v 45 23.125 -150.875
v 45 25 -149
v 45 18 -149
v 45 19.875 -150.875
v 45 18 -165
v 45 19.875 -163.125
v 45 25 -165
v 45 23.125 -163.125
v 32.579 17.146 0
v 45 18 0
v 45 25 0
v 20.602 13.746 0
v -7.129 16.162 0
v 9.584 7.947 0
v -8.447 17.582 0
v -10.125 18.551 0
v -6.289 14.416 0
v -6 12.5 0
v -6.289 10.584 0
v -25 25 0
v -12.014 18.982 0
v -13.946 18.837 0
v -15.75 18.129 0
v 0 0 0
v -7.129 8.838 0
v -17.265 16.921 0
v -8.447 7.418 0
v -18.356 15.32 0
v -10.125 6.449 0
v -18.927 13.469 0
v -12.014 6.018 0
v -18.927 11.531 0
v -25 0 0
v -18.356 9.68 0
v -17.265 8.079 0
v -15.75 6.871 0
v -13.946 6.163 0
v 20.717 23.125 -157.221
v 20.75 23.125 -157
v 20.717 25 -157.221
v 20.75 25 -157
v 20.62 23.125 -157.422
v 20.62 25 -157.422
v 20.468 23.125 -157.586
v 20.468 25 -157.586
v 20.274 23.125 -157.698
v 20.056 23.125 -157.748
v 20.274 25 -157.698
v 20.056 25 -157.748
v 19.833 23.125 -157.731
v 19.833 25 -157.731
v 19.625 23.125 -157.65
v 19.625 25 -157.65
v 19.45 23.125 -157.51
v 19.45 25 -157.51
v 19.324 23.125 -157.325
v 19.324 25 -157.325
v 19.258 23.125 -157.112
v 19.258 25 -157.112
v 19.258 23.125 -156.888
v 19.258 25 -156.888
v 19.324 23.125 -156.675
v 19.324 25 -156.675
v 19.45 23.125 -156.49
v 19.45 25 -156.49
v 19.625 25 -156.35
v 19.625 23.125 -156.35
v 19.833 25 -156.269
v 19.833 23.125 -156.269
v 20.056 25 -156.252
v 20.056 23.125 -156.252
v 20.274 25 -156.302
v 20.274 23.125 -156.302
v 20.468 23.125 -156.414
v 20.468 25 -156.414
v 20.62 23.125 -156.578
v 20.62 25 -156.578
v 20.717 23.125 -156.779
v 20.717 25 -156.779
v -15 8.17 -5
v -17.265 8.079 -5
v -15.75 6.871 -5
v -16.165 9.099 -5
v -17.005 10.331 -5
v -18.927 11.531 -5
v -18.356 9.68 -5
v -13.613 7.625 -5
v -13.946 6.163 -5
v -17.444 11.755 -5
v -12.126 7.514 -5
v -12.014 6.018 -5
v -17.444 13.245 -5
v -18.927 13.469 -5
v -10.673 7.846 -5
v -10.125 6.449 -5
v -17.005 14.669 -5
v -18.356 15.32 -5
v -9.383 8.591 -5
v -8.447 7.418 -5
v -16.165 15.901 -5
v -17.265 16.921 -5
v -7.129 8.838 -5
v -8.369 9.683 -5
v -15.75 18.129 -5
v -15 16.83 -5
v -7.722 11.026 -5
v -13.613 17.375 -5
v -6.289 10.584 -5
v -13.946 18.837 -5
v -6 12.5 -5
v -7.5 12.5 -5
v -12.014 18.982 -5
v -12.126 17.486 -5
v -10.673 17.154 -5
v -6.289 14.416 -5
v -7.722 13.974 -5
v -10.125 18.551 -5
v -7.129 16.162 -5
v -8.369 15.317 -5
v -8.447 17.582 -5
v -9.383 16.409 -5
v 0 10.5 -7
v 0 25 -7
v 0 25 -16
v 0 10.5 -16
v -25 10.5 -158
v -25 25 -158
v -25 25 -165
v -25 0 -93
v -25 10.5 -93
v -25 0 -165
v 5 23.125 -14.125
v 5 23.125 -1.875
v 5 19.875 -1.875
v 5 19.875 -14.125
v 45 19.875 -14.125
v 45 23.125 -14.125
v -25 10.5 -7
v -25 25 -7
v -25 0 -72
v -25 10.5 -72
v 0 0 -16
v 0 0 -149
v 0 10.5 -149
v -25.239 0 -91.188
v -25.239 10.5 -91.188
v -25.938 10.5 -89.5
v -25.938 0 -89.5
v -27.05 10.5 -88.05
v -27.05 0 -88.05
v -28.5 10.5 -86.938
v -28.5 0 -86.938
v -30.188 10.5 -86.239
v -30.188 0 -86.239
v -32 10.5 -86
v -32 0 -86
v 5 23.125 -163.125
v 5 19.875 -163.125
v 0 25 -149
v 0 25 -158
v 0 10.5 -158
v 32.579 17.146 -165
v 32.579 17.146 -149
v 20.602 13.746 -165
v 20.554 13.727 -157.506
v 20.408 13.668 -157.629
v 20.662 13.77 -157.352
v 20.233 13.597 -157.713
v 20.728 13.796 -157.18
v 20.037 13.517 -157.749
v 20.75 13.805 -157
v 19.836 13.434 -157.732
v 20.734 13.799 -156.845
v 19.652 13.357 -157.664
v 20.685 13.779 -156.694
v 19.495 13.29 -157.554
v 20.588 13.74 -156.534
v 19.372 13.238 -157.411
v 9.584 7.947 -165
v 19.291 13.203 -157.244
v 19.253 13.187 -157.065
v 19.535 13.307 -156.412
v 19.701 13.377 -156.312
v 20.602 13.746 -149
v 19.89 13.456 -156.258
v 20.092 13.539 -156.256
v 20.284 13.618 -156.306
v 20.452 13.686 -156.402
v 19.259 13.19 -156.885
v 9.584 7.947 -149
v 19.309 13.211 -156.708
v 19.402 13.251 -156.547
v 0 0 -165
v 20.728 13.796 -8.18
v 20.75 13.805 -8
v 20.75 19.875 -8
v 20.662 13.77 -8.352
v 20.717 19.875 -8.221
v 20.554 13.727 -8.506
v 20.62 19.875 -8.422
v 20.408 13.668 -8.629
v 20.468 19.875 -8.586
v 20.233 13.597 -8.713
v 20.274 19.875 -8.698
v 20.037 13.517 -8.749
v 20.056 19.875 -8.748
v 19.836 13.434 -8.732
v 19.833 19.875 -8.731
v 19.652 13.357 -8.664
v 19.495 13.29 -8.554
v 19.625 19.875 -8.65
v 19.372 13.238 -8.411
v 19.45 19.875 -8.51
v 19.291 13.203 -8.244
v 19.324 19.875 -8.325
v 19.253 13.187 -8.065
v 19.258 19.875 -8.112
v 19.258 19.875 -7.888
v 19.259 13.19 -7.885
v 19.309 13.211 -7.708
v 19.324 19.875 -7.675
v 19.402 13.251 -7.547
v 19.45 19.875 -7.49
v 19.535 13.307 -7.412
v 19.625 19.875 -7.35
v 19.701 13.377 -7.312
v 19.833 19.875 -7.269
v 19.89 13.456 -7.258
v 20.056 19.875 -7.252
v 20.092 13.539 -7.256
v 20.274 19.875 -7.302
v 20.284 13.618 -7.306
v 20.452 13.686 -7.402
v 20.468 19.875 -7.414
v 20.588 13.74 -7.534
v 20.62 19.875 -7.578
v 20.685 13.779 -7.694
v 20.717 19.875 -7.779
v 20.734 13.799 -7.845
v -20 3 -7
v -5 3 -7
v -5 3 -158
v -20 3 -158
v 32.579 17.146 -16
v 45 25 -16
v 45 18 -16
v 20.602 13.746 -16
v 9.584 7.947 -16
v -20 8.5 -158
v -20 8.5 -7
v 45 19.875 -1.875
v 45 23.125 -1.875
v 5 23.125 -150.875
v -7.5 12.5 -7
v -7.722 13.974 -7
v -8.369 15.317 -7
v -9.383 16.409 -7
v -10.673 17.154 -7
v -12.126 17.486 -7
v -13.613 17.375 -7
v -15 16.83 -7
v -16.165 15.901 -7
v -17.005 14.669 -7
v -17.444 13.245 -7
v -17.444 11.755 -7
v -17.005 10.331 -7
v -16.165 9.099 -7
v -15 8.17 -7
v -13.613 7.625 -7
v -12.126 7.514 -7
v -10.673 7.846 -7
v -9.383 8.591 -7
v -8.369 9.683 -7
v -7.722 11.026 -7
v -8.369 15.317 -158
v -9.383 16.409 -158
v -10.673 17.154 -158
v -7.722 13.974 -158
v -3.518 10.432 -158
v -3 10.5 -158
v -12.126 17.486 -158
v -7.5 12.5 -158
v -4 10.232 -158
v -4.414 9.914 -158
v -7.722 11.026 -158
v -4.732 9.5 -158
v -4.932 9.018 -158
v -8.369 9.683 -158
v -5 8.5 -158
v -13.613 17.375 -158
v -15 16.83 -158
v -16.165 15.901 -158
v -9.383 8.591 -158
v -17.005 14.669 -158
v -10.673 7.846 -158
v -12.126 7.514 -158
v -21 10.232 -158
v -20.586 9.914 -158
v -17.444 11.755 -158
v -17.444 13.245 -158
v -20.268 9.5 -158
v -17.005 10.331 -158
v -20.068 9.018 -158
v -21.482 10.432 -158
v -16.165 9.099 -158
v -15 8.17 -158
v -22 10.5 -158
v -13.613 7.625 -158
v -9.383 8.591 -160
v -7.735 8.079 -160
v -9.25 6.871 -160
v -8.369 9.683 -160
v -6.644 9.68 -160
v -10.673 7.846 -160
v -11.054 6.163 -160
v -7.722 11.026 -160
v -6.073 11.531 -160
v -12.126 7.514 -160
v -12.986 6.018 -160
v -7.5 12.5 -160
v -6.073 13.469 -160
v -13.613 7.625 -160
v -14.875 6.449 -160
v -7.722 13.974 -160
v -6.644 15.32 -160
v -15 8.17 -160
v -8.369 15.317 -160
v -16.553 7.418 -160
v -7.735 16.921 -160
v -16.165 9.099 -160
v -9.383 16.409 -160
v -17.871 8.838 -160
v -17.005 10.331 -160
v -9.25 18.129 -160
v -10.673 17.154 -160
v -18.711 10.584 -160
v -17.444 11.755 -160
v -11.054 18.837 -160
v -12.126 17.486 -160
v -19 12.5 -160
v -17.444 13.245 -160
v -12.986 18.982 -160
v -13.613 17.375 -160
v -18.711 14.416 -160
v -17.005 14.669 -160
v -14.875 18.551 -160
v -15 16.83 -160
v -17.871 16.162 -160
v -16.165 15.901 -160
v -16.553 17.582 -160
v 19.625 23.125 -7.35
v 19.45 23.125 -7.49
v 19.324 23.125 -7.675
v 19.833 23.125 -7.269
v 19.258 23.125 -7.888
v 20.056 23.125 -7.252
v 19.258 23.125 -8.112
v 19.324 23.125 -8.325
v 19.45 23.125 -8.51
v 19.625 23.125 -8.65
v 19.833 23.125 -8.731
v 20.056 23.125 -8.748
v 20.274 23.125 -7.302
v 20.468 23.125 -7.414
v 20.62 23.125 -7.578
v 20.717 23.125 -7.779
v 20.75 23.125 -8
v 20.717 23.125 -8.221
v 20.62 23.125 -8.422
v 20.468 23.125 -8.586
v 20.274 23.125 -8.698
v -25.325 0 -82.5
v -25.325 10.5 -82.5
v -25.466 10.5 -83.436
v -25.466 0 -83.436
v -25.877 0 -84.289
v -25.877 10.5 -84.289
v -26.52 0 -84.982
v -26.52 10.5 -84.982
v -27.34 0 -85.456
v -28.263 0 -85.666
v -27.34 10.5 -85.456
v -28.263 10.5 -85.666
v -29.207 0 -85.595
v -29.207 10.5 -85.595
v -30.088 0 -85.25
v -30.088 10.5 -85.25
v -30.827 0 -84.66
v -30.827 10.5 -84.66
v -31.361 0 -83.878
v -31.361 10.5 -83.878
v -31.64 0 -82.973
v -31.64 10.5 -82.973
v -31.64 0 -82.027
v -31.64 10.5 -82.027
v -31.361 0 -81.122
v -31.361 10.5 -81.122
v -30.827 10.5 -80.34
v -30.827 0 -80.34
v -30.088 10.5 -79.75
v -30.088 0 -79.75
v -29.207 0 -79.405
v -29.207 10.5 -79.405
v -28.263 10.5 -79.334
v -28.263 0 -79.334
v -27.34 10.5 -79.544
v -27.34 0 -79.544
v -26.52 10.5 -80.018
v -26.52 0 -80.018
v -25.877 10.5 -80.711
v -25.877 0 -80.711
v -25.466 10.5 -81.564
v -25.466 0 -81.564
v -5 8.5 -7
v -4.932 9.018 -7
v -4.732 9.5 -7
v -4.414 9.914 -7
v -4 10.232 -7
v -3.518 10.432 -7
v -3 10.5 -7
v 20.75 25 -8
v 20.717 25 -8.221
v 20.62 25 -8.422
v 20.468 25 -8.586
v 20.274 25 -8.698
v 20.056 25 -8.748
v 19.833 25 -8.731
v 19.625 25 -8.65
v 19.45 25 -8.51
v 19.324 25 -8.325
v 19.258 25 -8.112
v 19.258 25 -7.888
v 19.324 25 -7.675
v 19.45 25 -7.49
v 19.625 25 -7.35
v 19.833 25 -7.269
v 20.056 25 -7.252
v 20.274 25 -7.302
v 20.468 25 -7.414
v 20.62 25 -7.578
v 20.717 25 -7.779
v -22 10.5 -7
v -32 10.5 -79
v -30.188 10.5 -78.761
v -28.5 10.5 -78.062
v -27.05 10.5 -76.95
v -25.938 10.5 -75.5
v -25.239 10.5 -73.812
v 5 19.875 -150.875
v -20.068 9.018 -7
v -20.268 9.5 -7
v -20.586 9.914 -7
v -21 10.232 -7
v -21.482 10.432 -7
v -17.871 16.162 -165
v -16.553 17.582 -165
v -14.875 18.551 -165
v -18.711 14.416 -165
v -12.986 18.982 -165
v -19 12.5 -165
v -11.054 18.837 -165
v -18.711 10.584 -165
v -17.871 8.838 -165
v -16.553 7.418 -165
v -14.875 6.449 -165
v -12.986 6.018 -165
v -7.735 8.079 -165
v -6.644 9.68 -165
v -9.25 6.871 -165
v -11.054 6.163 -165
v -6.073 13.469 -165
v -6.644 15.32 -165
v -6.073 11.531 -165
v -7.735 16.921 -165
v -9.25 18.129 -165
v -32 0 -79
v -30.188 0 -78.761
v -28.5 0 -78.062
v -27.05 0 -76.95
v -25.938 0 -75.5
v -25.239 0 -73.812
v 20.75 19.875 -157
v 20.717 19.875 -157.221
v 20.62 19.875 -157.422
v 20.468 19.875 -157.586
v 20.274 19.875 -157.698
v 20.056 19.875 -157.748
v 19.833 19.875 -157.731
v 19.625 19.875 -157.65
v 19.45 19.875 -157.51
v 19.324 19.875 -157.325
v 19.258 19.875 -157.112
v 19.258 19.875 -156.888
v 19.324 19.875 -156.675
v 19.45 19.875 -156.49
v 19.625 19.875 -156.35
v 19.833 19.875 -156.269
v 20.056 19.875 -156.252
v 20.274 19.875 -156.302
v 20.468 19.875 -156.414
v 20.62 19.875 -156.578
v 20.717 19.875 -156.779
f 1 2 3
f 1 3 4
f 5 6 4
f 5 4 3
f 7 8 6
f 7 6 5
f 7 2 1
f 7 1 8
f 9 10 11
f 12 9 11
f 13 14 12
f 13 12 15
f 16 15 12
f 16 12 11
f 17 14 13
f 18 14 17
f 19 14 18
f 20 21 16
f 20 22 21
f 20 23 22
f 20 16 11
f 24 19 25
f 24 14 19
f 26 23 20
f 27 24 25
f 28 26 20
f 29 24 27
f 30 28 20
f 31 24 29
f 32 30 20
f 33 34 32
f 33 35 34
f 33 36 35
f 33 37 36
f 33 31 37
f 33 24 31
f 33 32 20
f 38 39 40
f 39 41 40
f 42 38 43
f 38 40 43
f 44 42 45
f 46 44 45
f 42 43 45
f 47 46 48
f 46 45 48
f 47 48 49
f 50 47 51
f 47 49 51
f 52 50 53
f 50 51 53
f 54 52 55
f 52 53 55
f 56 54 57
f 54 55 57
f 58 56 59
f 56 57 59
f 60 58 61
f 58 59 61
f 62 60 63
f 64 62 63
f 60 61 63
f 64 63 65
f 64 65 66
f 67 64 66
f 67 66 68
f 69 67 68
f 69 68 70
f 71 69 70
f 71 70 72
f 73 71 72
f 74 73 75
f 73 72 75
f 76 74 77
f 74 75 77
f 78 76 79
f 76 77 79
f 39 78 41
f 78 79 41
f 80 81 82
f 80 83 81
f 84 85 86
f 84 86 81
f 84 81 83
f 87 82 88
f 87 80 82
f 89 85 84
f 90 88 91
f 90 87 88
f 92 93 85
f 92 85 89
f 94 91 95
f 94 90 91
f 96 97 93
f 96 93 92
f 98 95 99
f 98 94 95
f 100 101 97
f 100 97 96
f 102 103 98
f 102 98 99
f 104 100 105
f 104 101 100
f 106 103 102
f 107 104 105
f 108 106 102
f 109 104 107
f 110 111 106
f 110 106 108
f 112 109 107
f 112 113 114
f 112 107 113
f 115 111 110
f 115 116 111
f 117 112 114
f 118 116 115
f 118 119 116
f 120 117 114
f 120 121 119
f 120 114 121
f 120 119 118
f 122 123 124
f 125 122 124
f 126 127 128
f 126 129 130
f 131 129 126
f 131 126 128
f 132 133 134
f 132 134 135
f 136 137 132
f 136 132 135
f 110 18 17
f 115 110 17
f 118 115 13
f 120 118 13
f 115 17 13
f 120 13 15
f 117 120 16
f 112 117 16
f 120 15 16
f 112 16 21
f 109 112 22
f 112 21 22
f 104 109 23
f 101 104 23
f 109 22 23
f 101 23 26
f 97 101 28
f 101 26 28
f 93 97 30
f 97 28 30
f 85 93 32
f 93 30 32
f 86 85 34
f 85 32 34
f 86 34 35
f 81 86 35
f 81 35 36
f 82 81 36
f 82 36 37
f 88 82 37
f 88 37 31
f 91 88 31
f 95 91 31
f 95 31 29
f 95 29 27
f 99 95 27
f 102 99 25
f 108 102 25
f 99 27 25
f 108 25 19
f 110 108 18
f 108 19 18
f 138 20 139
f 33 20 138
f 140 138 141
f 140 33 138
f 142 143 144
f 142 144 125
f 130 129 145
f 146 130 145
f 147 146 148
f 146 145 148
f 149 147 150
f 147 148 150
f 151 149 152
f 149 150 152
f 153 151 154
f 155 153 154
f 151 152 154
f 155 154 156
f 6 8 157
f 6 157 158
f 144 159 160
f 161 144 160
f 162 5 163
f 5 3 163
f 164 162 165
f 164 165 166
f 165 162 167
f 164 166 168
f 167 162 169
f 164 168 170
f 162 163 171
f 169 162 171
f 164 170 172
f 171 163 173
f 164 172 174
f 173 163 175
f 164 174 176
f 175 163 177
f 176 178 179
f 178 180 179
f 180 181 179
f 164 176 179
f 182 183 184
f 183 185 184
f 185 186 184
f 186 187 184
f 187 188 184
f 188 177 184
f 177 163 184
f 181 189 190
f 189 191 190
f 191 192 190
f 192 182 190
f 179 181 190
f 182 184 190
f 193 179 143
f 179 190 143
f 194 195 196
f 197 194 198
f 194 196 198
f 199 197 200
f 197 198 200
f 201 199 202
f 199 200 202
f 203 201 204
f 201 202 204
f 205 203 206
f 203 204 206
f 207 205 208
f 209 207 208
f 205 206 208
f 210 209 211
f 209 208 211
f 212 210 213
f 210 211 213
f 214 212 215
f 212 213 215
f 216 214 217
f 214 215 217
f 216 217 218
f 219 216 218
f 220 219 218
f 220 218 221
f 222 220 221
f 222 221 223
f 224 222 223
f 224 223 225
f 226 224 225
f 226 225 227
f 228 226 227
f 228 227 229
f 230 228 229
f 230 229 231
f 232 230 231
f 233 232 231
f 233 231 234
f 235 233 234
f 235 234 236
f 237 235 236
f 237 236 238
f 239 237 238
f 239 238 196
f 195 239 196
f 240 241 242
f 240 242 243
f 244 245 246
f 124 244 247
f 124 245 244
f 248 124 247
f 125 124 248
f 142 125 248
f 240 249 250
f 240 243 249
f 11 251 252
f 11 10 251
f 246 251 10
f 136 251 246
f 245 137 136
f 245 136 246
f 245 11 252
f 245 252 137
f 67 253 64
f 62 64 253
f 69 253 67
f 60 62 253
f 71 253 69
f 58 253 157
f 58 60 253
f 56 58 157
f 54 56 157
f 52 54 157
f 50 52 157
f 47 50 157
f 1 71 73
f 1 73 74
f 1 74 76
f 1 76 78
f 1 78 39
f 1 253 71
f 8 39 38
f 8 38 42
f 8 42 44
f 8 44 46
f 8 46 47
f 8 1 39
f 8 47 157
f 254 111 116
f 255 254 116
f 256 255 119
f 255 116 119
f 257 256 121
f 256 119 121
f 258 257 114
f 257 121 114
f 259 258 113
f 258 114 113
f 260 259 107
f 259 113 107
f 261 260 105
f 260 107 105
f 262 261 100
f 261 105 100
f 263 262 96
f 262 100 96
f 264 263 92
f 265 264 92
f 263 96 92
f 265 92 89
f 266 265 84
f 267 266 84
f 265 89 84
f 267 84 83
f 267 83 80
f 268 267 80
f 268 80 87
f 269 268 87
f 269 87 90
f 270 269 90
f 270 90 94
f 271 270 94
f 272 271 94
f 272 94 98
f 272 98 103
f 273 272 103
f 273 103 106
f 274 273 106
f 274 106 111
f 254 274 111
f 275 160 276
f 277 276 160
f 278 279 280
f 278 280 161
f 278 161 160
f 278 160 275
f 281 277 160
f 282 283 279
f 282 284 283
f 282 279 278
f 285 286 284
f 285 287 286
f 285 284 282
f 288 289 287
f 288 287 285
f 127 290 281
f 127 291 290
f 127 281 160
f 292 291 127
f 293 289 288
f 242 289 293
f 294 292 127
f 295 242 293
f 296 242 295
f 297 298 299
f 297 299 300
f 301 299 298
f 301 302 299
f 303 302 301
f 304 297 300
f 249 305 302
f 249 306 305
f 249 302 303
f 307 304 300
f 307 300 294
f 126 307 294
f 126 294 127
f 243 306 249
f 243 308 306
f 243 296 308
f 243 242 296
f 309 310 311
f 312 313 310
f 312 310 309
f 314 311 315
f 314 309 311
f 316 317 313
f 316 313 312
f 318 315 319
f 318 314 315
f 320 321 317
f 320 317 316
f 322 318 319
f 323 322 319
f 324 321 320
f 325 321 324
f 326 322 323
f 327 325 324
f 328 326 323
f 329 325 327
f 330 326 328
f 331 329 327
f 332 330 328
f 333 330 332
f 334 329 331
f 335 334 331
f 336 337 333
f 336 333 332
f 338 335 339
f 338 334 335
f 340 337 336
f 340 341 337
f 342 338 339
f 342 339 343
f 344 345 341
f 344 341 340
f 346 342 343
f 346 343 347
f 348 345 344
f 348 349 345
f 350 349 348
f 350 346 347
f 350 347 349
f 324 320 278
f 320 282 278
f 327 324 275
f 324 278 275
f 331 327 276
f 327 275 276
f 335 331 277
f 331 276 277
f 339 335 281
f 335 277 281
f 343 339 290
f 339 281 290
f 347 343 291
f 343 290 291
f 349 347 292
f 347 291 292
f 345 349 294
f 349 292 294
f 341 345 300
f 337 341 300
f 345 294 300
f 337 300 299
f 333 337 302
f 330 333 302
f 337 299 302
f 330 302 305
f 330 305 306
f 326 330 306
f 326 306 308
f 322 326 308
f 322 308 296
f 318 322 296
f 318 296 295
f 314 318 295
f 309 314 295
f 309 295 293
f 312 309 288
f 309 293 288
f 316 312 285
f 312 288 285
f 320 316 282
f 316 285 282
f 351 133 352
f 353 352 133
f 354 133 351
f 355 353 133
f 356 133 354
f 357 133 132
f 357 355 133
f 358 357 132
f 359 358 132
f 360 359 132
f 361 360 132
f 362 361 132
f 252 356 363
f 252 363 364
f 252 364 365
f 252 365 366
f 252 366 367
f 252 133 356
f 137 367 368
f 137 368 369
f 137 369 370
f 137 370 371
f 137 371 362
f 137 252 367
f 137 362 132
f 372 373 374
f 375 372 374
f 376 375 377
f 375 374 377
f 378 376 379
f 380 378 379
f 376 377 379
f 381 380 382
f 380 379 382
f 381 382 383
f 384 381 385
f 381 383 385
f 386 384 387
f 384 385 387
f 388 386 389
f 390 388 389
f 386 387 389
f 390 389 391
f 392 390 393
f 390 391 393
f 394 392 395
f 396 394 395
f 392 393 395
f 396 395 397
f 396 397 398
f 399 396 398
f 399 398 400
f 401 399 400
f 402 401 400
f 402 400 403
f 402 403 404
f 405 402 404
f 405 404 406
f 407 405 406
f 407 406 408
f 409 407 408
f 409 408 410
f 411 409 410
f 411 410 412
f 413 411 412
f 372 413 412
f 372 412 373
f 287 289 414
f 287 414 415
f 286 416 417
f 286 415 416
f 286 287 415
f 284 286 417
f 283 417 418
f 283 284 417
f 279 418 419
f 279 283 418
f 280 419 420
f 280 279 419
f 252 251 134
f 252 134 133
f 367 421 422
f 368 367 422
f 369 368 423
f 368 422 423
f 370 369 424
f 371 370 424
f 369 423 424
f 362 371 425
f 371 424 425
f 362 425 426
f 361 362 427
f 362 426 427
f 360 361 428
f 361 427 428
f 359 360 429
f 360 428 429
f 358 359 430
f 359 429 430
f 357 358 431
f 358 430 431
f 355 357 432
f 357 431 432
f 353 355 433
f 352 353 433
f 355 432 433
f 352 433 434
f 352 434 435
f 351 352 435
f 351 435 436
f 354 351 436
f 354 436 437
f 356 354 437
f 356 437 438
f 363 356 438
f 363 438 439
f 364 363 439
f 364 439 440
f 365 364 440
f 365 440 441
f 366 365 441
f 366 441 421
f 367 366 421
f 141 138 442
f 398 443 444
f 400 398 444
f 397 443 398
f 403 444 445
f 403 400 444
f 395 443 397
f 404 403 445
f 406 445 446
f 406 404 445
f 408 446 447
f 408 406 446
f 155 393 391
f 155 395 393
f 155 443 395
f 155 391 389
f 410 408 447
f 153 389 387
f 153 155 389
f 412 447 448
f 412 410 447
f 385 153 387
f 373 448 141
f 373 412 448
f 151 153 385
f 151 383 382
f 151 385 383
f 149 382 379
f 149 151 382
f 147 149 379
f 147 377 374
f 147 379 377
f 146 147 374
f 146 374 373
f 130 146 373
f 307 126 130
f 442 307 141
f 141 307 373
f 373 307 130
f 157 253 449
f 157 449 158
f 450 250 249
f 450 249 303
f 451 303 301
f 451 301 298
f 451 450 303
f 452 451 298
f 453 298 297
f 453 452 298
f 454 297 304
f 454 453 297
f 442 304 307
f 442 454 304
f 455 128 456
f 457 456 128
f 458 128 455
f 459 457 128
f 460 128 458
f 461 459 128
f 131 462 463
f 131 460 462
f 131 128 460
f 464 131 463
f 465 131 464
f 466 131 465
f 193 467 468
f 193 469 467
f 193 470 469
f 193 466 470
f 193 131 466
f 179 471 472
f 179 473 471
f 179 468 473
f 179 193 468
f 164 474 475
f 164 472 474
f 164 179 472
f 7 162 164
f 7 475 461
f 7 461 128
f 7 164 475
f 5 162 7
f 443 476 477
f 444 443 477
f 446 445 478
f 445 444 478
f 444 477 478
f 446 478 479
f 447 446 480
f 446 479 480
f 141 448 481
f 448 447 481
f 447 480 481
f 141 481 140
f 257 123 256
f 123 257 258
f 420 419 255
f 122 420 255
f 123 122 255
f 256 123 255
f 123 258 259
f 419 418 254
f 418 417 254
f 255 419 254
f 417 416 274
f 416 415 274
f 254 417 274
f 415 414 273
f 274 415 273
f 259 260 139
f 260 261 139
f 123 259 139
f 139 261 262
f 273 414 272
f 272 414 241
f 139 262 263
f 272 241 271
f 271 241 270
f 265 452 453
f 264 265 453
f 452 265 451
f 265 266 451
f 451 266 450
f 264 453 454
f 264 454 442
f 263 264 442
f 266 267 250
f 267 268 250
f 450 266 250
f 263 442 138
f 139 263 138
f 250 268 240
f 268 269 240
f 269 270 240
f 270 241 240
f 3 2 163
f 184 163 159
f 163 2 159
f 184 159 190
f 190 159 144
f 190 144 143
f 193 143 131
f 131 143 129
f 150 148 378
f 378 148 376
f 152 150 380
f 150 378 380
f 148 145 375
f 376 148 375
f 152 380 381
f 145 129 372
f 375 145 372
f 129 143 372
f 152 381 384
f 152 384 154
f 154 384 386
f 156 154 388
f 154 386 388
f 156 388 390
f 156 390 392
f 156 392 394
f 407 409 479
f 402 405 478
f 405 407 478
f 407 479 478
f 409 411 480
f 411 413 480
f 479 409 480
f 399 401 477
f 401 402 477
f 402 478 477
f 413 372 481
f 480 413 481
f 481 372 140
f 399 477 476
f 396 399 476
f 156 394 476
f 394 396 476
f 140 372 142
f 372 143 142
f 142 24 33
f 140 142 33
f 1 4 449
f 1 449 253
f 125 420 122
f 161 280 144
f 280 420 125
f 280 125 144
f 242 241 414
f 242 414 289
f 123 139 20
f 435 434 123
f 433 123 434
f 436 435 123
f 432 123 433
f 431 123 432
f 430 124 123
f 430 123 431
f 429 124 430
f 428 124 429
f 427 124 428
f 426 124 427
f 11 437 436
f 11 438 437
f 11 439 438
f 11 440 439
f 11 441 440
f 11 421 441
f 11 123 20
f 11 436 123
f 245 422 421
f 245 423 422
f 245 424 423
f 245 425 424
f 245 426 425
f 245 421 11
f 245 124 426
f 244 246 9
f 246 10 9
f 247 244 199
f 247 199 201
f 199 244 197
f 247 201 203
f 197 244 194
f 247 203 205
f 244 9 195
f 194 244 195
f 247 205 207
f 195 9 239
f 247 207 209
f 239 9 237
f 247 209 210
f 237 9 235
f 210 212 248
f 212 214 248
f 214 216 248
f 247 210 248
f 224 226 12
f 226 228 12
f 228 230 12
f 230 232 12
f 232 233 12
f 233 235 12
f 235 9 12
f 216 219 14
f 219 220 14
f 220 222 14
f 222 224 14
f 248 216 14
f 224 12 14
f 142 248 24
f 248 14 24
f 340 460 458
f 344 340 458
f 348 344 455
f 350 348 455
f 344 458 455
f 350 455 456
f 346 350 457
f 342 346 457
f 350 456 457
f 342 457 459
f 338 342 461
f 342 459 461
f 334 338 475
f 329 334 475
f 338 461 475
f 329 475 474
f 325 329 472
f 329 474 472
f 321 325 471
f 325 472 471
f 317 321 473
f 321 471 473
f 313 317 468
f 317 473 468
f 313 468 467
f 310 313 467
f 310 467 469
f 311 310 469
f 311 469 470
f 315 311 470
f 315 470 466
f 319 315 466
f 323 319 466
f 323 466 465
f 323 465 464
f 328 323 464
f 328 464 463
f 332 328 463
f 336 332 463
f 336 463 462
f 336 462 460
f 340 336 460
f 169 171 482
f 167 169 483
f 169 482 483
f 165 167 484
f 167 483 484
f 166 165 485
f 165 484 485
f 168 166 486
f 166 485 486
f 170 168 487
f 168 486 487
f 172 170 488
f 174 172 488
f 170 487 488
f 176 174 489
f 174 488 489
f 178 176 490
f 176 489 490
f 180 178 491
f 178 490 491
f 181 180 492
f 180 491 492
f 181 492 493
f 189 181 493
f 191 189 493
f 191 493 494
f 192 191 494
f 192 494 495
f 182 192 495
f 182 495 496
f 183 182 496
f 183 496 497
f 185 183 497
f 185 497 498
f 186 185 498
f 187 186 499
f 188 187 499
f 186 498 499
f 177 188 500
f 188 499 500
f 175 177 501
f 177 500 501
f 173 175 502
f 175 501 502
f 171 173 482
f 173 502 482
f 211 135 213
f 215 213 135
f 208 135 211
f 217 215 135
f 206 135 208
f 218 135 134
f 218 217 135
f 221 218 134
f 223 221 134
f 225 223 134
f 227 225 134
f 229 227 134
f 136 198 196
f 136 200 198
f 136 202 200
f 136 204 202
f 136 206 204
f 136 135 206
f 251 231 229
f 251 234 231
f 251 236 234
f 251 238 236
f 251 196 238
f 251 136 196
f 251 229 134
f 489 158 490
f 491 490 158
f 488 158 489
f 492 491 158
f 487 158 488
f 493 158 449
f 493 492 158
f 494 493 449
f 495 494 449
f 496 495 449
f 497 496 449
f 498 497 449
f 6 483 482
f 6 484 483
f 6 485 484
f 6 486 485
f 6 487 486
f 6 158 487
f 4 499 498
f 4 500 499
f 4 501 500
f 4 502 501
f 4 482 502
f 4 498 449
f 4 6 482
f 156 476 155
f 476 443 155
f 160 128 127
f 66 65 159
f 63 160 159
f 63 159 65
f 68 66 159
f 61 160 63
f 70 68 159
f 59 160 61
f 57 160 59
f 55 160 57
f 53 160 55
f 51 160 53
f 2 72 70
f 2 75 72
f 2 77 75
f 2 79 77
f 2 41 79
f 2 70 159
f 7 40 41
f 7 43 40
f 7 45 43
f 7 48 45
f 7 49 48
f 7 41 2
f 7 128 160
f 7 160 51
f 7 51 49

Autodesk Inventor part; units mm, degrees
ref_plane "YZ Plane" through (0, 0, 0) normal (1, 0, 0) x (0, 1, 0)
ref_plane "XZ Plane" through (0, 0, 0) normal (0, 1, 0) x (-1, 0, 0)
ref_plane "XY Plane" through (0, 0, 0) normal (0, 0, 1) x (1, 0, 0)
sketch "Sketch1" plane through (0, 0, 0) normal (0, 1, 0) x (-1, 0, 0)
  line L0 (0, 0) -> (25, 0)
  line L1 (25, 0) -> (25, -165)
  line L2 (25, -165) -> (0, -165)
  line L3 (0, -165) -> (0, 0)
  dimension "d0" = 25
  dimension "d1" = 165
extrude "Extrusion1" add sketch "Sketch1" along normal blind 3
sketch "Sketch2" plane through (0, 3, 0) normal (0, 1, 0) x (1, 0, 0)
  line L0 (-25, 165) -> (-25, 0) projected
  line L1 (0, 0) -> (0, 165) projected
  line L2 (-25, 0) -> (0, 0)
  line L3 (0, 0) -> (0, 7)
  line L4 (0, 7) -> (-25, 7)
  line L5 (-25, 7) -> (-25, 0)
  line L6 (0, 165) -> (-25, 165) projected
  line L7 (-25, 165) -> (0, 165)
  line L8 (0, 165) -> (0, 158)
  line L9 (0, 158) -> (-25, 158)
  line L10 (-25, 158) -> (-25, 165)
  dimension "d4" = 7
  dimension "d5" = 7
extrude "Extrusion2" add sketch "Sketch2" along normal blind 22 contours L6 L1 L9 L0 | L4 L1 L2 L0
sketch "Sketch3" plane through (-25, 0, 0) normal (0, 0, 1) x (1, 0, 0)
  point P0 (25, 0)
sketch "Sketch4" plane through (-25, 0, 0) normal (0, 0, 1) x (1, 0, 0)
  line L0 (25, 25) -> (0, 25) construction
  line L1 (25, 0) -> (0, 25) construction
  circle A0 centre (12.5, 12.5) radius 6.5
  dimension "d8" = 13
extrude "Extrusion3" cut sketch "Sketch4" against normal blind 5
sketch "Sketch5" plane through (0, 0, -165) normal (0, 0, -1) x (-1, 0, 0)
  circle A0 centre (12.5, 12.5) radius 6.5 projected
  circle A1 centre (12.5, 12.5) radius 6.5
  point P0 (0, 0)
extrude "Extrusion4" cut sketch "Sketch5" against normal blind 5
sketch "Sketch6" plane through (-25, 0, 0) normal (0, 0, 1) x (1, 0, 0)
  circle A0 centre (12.5, 12.5) radius 6.5 projected
  circle A1 centre (12.5, 12.5) radius 5
  point P0 (25, 0)
  dimension "d13" = 10
extrude "Extrusion5" cut sketch "Sketch6" against normal blind 165 contours A1
sketch "Sketch7" plane through (-25, 3, -158) normal (0, 0, 1) x (1, 0, 0)
  line L0 (25, 0) -> (25, 22) construction
  line L1 (0, 0) -> (0, 22) construction
  point P0 (25, -3)
sketch "Sketch8" plane through (-25, 3, -158) normal (0, 0, 1) x (1, 0, 0)
  circle A0 centre (12.5, 9.5) radius 5 projected
  point P0 (25, -3)
sketch "Sketch9" plane through (0, 3, 0) normal (0, 1, 0) x (1, 0, 0)
  line L0 (-25, 158) -> (0, 158) projected
  line L1 (0, 7) -> (-25, 7) projected
  line L2 (-25, 158) -> (-20, 158)
  line L3 (-20, 158) -> (-20, 7)
  line L4 (-20, 7) -> (-25, 7)
  line L5 (-25, 7) -> (-25, 158)
  line L6 (0, 0) -> (0, 7) projected
  line L7 (0, 7) -> (-5, 7)
  line L8 (-5, 7) -> (-5, 158)
  line L9 (-5, 158) -> (0, 158)
  line L10 (0, 158) -> (0, 7)
  dimension "d16" = 5
  dimension "d17" = 5
extrude "Extrusion6" add sketch "Sketch9" along normal blind 7.5 contours L0 L3 L1 L5 | L0 L10 L1 L8
fillet "Fillet1" radius 2 2 edges at (-5, 10.5, -82.5) (-20, 10.5, -82.5)
sketch "Sketch10" plane through (0, 0, 0) normal (1, 0, 0) x (0, 0, -1)
  line L0 (0, 0) -> (0, 25) projected
  line L1 (165, 0) -> (0, 0) projected
  line L2 (0, 25) -> (16, 25)
  line L3 (16, 25) -> (16, 0)
  line L4 (16, 0) -> (0, 0)
  line L5 (0, 0) -> (0, 25)
  line L6 (165, 0) -> (165, 25) projected
  line L7 (165, 25) -> (149, 25)
  line L8 (149, 25) -> (149, 0)
  line L9 (149, 0) -> (165, 0)
  line L10 (165, 0) -> (165, 25)
  dimension "d21" = 16
  dimension "d22" = 16
extrude "Extrusion7" add sketch "Sketch10" along normal blind 45
sketch "Sketch11" plane through (45, 0, 0) normal (1, 0, 0) x (0, 0, -1)
  line L0 (7, 25) -> (0, 25) construction
  line L1 (16, 0) -> (16, 25) construction
  line L2 (0, 25) -> (16, 25) construction
  line L3 (16, 25) -> (7, 25) construction
  line L4 (8, 25) -> (8, 21.5) construction
  line L5 (14.125, 19.875) -> (1.875, 19.875)
  line L6 (1.875, 19.875) -> (1.875, 23.125)
  line L7 (1.875, 23.125) -> (14.125, 23.125)
  line L8 (14.125, 23.125) -> (14.125, 19.875)
  line L9 (14.125, 19.875) -> (1.875, 23.125) construction
  line L10 (1.875, 19.875) -> (14.125, 23.125) construction
  line L11 (165, 25) -> (149, 25) construction
  line L12 (157, 25) -> (157, 21.5) construction
  line L13 (163.125, 19.875) -> (150.875, 19.875)
  line L14 (150.875, 19.875) -> (150.875, 23.125)
  line L15 (150.875, 23.125) -> (163.125, 23.125)
  line L16 (163.125, 23.125) -> (163.125, 19.875)
  line L17 (163.125, 19.875) -> (150.875, 23.125) construction
  line L18 (150.875, 19.875) -> (163.125, 23.125) construction
  point P0 (0, 0)
  dimension "d25" = 3.5
  dimension "d26" = 12.25
  dimension "d27" = 3.25
  dimension "d28" = 3.5
  dimension "d29" = 12.25
  dimension "d30" = 3.25
extrude "Extrusion8" cut sketch "Sketch11" against normal blind 40
sketch "Sketch12" plane through (45, 0, 0) normal (1, 0, 0) x (0, 0, -1)
  line L0 (16, 0) -> (16, 25) construction
  line L1 (0, 19.875) -> (16, 19.875) construction
  line L2 (16, 19.875) -> (16, 18) construction
  line L3 (16, 18) -> (0, 18) construction
  line L4 (0, 18) -> (0, 19.875) construction
  point P0 (0, 0)
  dimension "d33" = 1.875
sketch "Sketch13" plane through (-25, 0, 0) normal (0, 0, 1) x (1, 0, 0)
  line L0 (70, 0) -> (70, 25) construction
  line L1 (70, 25) -> (70, 18) construction
  arc A0 (70, 18) -> (25, 0) centre (67.8851, -41.9627) ccw
  line L2 (70, 25) -> (70, 0) projected
  line L3 (70, 18) -> (70, 0)
  line L4 (70, 0) -> (25, 0)
  dimension "d34" = 7
  dimension "d35" = 60
extrude "Extrusion9" cut sketch "Sketch13" against normal blind 165
sketch "Sketch14" plane through (0, 10.5, 0) normal (0, 1, 0) x (1, 0, 0)
  point P0 (0, 0)
sketch "Sketch15" plane through (-25, 0, -165) normal (0, 0, -1) x (-1, 0, 0)
  circle A0 centre (-12.5, 12.5) radius 6.5 construction
  circle A1 centre (-12.5, 12.5) radius 25.4 construction
  point P0 (-25, 0)
  dimension "d38" = 50.8
sketch "Sketch16" plane through (0, 10.5, 0) normal (0, 1, 0) x (1, 0, 0)
  line L0 (-25, 0) -> (-25, 165) projected
  line L1 (-25, 82.5) -> (-32, 82.5)
  line L2 (-32, 82.5) -> (-32, 86)
  line L3 (-32, 86) -> (-25, 86)
  line L4 (-25, 86) -> (-25, 82.5)
  line L5 (-32, 82.5) -> (-25, 82.5)
  line L6 (-25, 82.5) -> (-25, 79)
  line L7 (-25, 79) -> (-32, 79)
  line L8 (-32, 79) -> (-32, 82.5)
  point P0 (0, 0)
  dimension "d39" = 7
  dimension "d40" = 3.5
  dimension "d41" = 3.5
extrude "Extrusion10" add sketch "Sketch16" against normal blind 10.5
sketch "Sketch17" plane through (0, 10.5, 0) normal (0, 1, 0) x (1, 0, 0)
  line L0 (-32, 79) -> (-25, 79) construction
  line L1 (-25, 86) -> (-32, 86) construction
  line L2 (-25, 79) -> (-32, 86) construction
  circle A0 centre (-28.5, 82.5) radius 3.175
  point P0 (0, 0)
  dimension "d44" = 6.35
extrude "Extrusion11" cut sketch "Sketch17" against normal blind 10.5
fillet "Fillet2" radius 7 2 edges at (-25, 5.25, -79) (-25, 5.25, -86)
sketch "Sketch18" plane through (0, 25, 0) normal (0, 1, 0) x (1, 0, 0)
  line L0 (45, 1.875) -> (45, 14.125) construction
  line L1 (45, 8) -> (20, 8) construction
  circle A0 centre (20, 8) radius 0.75
  line L2 (45, 150.875) -> (45, 163.125) construction
  line L3 (45, 157) -> (20, 157) construction
  circle A1 centre (20, 157) radius 0.75
  point P0 (0, 0)
  dimension "d48" = 25
  dimension "d49" = 1.5
  dimension "d50" = 25
  dimension "d51" = 1.5
extrude "Extrusion12" cut sketch "Sketch18" against normal blind 25
properties part number "frontAxelHolder 11-28"
